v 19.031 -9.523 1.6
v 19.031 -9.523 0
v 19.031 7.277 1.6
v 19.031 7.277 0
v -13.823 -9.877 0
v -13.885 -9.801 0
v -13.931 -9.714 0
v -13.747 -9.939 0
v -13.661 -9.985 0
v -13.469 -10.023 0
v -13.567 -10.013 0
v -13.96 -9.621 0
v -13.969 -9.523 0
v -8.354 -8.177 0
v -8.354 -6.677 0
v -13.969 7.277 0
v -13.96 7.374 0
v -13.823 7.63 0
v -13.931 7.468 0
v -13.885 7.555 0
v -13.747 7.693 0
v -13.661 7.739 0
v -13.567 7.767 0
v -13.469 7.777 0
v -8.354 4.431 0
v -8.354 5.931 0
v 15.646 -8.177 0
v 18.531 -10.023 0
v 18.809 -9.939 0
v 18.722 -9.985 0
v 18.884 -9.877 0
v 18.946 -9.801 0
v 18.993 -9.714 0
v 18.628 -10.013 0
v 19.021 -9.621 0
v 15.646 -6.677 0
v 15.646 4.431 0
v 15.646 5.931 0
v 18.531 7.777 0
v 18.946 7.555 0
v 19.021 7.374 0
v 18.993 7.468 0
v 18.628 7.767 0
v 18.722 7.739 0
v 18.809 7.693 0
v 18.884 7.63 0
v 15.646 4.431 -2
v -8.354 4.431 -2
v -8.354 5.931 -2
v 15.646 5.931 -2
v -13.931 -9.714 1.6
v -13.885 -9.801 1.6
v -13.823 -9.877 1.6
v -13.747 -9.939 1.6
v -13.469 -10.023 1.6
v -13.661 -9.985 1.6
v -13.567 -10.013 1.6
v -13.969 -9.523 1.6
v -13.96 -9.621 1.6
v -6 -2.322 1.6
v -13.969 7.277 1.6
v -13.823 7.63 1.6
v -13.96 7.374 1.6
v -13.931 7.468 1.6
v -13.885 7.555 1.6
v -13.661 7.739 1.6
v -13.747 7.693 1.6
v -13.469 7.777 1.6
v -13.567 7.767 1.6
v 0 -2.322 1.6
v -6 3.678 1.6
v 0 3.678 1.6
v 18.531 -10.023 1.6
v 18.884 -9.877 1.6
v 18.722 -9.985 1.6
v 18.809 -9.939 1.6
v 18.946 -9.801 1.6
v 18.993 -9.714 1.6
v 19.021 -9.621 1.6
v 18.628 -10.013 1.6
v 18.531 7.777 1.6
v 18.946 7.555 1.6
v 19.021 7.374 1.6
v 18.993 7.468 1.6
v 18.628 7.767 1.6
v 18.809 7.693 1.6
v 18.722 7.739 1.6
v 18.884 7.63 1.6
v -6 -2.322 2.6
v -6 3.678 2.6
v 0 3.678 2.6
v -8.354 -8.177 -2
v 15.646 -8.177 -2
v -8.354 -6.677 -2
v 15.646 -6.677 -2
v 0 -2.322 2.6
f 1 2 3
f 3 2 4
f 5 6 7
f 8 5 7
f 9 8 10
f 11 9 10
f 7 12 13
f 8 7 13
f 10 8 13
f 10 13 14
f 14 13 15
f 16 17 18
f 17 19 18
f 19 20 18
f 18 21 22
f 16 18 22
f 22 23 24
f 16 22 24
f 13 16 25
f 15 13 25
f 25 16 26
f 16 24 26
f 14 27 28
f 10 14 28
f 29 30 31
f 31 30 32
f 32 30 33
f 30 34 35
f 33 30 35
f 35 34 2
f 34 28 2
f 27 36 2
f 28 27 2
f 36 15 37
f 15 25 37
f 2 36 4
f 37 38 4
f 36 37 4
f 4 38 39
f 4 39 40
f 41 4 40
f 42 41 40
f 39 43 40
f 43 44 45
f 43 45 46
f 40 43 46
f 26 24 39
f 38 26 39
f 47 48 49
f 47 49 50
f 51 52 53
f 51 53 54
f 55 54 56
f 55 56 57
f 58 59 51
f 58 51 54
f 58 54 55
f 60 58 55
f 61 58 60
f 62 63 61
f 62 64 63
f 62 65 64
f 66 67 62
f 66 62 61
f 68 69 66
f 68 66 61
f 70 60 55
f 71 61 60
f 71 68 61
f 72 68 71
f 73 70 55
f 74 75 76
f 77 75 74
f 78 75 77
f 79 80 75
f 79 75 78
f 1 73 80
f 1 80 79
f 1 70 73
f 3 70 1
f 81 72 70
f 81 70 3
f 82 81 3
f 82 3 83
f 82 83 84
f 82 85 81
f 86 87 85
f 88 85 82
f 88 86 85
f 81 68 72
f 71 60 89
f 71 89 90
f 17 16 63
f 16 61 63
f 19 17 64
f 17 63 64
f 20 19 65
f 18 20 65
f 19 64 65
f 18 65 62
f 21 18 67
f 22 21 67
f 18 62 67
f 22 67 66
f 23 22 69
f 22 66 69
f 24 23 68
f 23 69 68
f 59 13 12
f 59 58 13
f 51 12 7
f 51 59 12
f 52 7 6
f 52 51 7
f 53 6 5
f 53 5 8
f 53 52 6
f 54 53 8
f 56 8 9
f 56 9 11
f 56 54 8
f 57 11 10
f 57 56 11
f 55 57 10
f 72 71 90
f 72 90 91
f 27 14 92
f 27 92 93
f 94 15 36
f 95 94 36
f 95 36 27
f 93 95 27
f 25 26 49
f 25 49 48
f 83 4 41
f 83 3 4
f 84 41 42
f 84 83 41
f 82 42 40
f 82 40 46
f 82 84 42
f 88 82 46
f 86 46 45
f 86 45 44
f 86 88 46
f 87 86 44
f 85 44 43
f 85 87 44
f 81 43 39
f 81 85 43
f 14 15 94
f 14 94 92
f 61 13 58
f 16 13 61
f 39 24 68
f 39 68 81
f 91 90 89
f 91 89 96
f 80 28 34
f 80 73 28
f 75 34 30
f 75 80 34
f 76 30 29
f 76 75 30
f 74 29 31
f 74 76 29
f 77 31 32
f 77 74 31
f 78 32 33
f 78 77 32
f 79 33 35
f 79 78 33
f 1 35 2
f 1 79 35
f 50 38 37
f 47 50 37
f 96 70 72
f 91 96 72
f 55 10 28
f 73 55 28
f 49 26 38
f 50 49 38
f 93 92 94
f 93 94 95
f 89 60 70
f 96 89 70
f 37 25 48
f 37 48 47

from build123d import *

# Parameters (mm, degrees)
F0_W     = 33
F0_H     = 17.8
F1_DEPTH = 1.6
F2_R     = 0.5
F3_W     = 6
F3_H     = 6
F4_DEPTH = 1
F5_W     = 24
F5_H     = 1.5
F6_DEPTH = 2


with BuildPart() as f1:
    # F0 (on Top) → F1 (new body)
    with BuildSketch(Plane.XY):
        with Locations((2.53072, -1.123066)):
            Rectangle(F0_W, F0_H)
    extrude(amount=F1_DEPTH)

    # F2
    f2_edges = [f1.edges().sort_by_distance(p)[0] for p in [
        (19.03072, -10.023066, 0.8),
        (-13.96928, -10.023066, 0.8),
        (19.03072, 7.776934, 0.8),
        (-13.96928, 7.776934, 0.8),
    ]]
    fillet(f2_edges, radius=F2_R)

    # F3 (on face) → F4 (join)
    with BuildSketch(Plane.XY.offset(1.6)):
        with Locations((-3, 0.677927)):
            Rectangle(F3_W, F3_H)
    extrude(amount=F4_DEPTH)

    # F5 (on face) → F6 (join)
    with BuildSketch(Plane(origin=(0, 0, 0), x_dir=(1, 0, 0), z_dir=(0, 0, -1))):
        with Locations((3.64614, 7.426964)):
            Rectangle(F5_W, F5_H)
        with Locations((3.64614, -5.180832)):
            Rectangle(F5_W, F5_H)
    extrude(amount=F6_DEPTH)


solid = f1.part
